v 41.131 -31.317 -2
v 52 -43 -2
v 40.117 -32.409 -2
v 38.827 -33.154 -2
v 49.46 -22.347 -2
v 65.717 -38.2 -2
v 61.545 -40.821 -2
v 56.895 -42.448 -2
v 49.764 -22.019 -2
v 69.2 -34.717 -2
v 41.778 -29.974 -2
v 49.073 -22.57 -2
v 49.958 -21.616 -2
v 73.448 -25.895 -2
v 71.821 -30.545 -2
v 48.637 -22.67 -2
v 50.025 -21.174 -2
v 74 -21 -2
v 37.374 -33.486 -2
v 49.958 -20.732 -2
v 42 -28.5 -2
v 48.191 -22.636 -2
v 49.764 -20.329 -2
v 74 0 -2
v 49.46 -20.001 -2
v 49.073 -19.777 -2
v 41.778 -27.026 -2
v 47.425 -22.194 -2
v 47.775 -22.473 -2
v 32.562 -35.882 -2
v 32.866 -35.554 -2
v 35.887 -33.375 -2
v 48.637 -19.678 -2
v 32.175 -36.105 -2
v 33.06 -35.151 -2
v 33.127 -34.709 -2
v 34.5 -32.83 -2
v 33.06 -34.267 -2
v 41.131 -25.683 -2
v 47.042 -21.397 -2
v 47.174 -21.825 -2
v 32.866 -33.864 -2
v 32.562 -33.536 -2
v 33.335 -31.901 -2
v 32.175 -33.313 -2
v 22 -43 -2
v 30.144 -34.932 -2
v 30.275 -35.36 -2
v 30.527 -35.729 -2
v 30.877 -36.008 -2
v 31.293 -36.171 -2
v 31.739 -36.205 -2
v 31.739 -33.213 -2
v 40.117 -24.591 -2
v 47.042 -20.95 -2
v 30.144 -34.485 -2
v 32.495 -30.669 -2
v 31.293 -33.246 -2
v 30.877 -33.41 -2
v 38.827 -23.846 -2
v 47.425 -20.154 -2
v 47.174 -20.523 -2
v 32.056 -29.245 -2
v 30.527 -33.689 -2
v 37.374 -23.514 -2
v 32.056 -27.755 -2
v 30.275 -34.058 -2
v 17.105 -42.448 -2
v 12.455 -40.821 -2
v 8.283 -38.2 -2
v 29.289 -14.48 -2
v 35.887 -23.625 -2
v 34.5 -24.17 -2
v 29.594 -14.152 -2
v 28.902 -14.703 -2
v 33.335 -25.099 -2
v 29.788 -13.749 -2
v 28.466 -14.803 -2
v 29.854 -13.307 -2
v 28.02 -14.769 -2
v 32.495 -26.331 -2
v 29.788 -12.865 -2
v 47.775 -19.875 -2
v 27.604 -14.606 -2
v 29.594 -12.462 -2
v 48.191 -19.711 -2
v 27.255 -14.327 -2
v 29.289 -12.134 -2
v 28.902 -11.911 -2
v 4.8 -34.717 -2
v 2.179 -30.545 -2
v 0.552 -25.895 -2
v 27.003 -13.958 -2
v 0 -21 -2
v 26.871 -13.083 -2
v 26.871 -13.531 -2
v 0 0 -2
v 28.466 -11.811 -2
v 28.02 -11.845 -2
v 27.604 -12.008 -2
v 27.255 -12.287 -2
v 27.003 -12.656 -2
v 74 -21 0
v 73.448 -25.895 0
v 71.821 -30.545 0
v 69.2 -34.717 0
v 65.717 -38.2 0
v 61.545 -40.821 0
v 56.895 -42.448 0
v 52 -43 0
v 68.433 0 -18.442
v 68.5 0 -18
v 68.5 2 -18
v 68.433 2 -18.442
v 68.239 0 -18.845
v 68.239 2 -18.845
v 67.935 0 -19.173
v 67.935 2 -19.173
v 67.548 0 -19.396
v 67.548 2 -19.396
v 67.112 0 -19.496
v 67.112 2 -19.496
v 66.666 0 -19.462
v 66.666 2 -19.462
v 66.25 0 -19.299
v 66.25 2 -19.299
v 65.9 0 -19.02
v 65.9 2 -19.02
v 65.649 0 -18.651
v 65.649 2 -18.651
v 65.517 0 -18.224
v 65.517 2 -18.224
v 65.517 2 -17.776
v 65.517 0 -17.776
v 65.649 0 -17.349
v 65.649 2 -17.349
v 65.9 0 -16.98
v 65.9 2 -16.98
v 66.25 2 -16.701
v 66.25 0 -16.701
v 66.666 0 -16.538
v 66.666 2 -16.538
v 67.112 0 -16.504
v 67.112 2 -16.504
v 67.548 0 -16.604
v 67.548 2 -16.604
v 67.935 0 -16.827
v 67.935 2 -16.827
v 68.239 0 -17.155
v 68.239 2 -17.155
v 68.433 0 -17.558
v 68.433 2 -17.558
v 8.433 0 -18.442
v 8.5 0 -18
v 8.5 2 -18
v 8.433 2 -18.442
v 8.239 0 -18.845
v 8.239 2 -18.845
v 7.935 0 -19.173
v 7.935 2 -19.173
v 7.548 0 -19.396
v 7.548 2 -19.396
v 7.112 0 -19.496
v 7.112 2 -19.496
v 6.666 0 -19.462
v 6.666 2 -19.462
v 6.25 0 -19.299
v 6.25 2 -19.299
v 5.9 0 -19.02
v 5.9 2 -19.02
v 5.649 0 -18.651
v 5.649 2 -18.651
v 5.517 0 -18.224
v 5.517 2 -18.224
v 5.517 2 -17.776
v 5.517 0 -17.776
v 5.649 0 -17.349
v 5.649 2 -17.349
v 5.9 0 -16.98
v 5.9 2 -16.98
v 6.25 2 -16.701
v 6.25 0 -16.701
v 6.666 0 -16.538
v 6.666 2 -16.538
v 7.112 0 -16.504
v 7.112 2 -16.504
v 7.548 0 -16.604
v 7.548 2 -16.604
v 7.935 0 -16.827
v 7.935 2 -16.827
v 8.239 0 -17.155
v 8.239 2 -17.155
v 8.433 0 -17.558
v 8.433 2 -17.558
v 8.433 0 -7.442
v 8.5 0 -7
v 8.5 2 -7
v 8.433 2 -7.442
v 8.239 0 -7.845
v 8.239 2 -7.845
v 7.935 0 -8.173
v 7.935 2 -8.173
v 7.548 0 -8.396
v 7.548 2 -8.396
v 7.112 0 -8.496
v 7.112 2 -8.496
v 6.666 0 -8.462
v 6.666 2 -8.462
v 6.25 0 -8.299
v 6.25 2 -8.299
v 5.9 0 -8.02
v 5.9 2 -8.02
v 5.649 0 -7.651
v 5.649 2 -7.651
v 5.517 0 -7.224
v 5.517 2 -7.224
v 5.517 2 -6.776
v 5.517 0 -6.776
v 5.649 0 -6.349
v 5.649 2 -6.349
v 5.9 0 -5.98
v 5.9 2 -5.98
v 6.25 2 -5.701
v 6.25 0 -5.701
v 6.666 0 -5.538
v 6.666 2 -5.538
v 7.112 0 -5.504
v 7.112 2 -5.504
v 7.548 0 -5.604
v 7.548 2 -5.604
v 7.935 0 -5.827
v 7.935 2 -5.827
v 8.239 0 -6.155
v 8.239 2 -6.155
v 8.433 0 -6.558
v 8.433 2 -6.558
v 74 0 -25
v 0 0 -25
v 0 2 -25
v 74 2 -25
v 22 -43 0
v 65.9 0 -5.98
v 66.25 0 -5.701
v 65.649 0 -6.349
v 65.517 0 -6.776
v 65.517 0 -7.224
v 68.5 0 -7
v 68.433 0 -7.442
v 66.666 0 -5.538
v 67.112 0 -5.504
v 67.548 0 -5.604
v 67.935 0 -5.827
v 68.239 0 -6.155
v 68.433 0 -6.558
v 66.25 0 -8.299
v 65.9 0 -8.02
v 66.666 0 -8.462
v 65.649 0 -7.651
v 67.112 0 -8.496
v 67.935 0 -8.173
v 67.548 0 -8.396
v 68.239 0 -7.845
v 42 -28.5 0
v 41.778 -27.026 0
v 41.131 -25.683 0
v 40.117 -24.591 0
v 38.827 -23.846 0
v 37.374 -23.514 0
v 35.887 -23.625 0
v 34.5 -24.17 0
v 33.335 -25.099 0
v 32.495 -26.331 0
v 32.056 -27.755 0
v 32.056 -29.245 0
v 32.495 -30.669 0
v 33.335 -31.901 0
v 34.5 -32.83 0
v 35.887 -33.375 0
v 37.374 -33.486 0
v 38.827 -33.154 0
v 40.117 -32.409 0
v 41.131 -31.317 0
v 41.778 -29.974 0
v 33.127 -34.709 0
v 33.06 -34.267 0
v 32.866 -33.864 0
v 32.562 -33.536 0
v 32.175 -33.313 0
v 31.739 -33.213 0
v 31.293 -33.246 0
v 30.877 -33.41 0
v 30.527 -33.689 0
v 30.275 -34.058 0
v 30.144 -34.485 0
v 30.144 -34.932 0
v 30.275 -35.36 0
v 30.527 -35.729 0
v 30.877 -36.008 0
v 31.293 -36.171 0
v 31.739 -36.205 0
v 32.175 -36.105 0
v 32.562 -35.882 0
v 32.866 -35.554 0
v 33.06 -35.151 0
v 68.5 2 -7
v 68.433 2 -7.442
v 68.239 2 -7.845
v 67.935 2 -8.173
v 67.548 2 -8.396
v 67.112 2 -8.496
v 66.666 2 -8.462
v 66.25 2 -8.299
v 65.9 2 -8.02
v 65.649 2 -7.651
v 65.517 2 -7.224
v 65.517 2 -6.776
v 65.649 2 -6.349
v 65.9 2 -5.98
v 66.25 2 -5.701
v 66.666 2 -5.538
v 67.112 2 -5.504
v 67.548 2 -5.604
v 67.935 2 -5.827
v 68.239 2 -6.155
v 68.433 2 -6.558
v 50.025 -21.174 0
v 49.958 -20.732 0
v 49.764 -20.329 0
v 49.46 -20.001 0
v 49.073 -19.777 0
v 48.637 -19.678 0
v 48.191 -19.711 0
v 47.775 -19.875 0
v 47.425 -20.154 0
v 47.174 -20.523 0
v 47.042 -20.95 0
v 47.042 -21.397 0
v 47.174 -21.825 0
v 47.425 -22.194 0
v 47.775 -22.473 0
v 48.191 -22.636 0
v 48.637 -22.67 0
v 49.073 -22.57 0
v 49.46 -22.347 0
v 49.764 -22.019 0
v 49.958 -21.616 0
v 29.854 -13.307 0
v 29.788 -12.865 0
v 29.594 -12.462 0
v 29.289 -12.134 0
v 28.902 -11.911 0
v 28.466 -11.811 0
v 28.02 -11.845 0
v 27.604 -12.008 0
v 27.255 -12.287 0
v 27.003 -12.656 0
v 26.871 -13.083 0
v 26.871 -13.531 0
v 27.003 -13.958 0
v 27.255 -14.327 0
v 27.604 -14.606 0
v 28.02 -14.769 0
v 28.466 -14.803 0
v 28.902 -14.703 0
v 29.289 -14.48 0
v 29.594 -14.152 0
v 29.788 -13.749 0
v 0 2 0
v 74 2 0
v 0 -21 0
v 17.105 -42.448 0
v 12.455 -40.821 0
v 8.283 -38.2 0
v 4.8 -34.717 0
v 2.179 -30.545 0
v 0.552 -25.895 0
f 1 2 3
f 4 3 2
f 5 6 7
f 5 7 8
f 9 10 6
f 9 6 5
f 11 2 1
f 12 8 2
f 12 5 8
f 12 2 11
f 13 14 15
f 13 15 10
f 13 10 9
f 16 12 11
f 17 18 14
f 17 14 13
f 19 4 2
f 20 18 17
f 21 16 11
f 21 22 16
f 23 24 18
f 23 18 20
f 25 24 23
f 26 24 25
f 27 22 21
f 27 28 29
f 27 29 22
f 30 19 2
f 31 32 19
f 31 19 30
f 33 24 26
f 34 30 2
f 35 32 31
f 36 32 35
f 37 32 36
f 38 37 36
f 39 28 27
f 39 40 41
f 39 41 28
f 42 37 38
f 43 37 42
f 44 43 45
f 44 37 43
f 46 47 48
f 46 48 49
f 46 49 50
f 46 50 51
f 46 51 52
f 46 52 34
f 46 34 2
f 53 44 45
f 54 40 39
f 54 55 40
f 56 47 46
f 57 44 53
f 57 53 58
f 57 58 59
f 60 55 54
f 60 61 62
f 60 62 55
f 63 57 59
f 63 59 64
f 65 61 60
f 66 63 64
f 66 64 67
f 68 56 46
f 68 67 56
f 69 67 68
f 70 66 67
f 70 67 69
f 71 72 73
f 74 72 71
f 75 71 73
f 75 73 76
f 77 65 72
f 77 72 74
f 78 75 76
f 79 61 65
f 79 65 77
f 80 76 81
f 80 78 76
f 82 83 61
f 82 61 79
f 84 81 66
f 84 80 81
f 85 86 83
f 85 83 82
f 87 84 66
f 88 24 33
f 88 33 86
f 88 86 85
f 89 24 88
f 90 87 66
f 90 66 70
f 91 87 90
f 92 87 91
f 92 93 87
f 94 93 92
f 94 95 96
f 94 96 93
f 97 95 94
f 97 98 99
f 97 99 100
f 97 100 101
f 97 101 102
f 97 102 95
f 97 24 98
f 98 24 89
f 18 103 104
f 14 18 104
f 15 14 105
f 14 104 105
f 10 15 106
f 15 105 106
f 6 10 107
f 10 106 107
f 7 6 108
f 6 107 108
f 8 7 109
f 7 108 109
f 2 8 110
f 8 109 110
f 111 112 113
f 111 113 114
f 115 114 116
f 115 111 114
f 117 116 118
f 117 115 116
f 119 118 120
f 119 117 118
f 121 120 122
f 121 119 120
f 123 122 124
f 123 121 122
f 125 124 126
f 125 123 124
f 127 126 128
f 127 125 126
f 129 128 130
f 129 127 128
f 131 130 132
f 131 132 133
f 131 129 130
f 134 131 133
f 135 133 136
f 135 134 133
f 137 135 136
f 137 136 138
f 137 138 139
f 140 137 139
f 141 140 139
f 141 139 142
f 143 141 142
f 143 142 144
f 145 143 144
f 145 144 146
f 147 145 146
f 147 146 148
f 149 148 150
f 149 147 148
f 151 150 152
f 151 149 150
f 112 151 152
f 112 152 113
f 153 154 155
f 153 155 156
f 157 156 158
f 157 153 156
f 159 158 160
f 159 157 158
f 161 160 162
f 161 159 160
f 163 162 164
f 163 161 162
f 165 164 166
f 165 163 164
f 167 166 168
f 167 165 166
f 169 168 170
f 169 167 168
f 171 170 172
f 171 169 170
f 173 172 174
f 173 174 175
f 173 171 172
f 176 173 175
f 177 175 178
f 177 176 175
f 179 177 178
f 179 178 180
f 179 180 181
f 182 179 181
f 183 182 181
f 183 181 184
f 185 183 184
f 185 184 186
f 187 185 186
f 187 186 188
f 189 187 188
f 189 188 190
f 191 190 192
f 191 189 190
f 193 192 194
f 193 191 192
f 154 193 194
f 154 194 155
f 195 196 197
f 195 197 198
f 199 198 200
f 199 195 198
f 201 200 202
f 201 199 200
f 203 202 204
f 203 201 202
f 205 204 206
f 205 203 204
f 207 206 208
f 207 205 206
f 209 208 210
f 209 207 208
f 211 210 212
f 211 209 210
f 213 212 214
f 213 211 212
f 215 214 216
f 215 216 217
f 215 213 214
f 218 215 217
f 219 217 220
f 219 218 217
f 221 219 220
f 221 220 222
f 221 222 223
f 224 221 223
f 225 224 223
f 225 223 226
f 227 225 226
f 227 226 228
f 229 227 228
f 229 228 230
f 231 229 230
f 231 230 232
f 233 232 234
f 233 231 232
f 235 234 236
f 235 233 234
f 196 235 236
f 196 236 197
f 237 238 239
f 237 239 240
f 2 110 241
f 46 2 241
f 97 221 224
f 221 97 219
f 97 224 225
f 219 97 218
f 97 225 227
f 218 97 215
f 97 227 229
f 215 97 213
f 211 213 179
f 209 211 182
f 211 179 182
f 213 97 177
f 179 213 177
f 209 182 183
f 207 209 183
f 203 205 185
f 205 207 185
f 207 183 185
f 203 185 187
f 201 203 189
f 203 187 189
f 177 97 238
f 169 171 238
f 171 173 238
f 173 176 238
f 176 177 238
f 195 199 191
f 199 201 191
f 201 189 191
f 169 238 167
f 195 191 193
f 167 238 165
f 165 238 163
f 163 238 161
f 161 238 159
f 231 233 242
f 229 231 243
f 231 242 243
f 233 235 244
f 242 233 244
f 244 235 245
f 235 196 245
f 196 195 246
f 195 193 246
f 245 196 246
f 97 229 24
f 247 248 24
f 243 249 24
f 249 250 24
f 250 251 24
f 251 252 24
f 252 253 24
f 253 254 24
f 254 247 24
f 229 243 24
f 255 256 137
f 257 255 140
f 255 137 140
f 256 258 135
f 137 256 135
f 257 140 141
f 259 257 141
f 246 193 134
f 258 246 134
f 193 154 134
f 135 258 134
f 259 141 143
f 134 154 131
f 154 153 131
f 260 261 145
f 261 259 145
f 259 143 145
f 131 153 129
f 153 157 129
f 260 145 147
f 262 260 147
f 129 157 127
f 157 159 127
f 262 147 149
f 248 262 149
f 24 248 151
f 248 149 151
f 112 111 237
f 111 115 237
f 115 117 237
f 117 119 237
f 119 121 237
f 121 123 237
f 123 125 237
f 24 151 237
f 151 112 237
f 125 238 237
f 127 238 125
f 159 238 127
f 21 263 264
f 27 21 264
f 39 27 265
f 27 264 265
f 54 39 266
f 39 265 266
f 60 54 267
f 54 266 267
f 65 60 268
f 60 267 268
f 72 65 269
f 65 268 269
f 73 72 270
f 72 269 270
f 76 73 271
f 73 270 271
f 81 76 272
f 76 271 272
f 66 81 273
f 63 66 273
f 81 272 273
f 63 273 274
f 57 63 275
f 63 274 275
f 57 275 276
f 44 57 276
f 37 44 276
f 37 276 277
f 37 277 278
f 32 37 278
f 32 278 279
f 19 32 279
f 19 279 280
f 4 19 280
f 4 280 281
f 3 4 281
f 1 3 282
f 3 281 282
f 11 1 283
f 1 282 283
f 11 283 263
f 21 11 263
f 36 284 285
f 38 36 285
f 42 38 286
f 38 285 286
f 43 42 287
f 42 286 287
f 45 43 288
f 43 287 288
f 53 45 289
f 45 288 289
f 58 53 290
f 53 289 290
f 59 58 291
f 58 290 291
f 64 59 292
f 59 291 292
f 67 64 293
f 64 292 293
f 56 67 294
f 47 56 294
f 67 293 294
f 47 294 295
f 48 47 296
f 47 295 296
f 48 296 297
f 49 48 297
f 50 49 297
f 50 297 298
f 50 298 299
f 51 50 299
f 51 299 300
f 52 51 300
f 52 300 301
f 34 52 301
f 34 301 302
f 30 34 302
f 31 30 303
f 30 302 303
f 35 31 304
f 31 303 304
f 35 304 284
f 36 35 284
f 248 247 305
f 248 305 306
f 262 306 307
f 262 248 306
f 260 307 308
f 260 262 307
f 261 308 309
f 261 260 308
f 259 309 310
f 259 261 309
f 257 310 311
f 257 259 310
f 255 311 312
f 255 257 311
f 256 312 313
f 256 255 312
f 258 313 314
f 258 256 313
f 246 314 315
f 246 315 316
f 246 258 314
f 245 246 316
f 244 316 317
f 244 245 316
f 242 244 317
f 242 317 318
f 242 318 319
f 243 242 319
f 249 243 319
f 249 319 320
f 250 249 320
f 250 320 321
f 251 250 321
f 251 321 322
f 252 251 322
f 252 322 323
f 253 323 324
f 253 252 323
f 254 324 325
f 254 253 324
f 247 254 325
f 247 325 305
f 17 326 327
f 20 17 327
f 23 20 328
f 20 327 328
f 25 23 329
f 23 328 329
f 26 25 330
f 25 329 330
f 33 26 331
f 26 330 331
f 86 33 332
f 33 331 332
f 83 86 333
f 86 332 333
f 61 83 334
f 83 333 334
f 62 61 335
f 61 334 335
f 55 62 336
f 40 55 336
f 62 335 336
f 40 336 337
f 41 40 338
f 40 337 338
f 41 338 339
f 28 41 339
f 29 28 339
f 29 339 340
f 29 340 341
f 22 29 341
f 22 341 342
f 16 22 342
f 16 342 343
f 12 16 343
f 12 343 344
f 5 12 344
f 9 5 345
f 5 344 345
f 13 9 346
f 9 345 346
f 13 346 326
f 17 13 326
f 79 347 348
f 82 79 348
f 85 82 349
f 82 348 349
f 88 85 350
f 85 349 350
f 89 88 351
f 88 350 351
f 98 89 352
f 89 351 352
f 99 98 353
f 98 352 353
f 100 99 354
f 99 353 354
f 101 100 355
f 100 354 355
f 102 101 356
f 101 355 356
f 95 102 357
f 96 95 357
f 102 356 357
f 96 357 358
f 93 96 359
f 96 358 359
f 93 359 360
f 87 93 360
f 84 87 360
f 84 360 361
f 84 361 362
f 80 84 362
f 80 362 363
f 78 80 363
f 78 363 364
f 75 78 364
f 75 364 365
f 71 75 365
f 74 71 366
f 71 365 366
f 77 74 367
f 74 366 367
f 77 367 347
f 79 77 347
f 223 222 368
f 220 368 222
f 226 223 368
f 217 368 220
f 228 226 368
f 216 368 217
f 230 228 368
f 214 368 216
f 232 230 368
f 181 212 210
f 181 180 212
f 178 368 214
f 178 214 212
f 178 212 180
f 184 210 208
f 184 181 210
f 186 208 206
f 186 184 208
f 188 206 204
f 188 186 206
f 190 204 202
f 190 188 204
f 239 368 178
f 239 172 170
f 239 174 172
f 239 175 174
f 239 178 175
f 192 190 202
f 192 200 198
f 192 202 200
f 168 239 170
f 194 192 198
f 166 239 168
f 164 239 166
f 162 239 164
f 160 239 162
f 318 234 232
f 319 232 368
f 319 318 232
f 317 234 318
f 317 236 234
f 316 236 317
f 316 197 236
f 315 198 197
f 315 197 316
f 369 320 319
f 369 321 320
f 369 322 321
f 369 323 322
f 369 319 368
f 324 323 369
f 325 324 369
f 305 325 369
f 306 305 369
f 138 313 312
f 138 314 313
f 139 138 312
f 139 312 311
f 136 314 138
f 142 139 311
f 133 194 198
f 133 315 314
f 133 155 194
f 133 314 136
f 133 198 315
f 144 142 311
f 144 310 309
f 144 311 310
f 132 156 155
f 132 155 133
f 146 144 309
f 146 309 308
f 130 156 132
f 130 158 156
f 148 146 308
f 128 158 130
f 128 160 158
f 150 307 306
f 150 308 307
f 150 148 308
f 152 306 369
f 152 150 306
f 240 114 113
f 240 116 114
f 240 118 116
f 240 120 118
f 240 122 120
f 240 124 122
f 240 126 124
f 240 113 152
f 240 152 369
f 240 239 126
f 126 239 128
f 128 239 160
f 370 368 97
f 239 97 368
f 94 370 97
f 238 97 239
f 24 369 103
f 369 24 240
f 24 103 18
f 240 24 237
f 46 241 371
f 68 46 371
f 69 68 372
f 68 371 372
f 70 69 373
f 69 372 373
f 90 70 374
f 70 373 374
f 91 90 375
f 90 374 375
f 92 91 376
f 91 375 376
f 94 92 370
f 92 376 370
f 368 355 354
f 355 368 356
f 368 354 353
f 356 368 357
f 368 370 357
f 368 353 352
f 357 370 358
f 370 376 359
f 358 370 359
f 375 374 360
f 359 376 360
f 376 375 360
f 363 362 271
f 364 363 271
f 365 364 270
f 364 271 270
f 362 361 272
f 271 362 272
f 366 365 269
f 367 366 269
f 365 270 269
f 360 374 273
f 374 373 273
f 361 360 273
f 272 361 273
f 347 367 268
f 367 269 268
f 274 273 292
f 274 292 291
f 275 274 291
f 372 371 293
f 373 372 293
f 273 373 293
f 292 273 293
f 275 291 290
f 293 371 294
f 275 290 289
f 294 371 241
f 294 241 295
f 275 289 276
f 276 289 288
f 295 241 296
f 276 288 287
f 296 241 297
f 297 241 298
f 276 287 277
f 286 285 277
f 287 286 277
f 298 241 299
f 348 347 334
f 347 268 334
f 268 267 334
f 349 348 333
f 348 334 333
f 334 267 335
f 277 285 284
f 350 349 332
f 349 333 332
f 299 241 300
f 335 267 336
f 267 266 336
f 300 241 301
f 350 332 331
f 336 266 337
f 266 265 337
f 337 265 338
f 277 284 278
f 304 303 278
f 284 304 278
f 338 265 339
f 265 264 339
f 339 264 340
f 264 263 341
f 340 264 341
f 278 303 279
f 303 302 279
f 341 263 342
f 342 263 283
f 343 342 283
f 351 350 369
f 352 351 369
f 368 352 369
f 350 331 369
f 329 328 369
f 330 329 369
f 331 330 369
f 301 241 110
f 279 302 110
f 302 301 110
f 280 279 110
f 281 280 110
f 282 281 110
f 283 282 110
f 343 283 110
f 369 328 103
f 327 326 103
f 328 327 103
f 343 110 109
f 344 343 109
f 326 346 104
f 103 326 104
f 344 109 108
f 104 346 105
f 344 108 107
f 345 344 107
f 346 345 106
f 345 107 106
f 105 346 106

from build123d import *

# Parameters (mm, degrees)
SKETCH_1_W      = 74
SKETCH_1_H      = 25
SKETCH_1_R      = 1.5
EXTRUDE_1_DEPTH = 2
SKETCH_2_R      = 5
SKETCH_2_R_2    = 1.5
EXTRUDE_2_DEPTH = 2


with BuildPart() as part:
    # Эскиз1 → Бобышка-Вытянуть1 (new body)
    with BuildSketch(Plane(origin=(0, 0, 0), x_dir=(1, 0, 0), z_dir=(0, 1, 0))):
        with Locations((37, 12.5)):
            Rectangle(SKETCH_1_W, SKETCH_1_H)
        with Locations((7, 18)):
            Circle(SKETCH_1_R, mode=Mode.SUBTRACT)
        with Locations((67, 18)):
            Circle(SKETCH_1_R, mode=Mode.SUBTRACT)
        with Locations((7, 7)):
            Circle(SKETCH_1_R, mode=Mode.SUBTRACT)
        with Locations((67, 7)):
            Circle(SKETCH_1_R, mode=Mode.SUBTRACT)
    extrude(amount=EXTRUDE_1_DEPTH)

    # Эскиз2 → Бобышка-Вытянуть2 (add)
    with BuildSketch(Plane.XY):
        with BuildLine():
            Line((0, 2), (74, 2))
            Line((74, 2), (74, -21))
            ThreePointArc((74, -21), (67.556349186, -36.556349186), (52, -43))
            Line((52, -43), (22, -43))
            ThreePointArc((22, -43), (6.443650814, -36.556349186), (0, -21))
            Line((0, -21), (0, 2))
        make_face()
        with Locations((37, -28.5)):
            Circle(SKETCH_2_R, mode=Mode.SUBTRACT)
        with Locations((28.354168617, -13.306972233)):
            Circle(SKETCH_2_R_2, mode=Mode.SUBTRACT)
        with Locations((48.525028222, -21.173764644)):
            Circle(SKETCH_2_R_2, mode=Mode.SUBTRACT)
        with Locations((31.626756345, -34.708845272)):
            Circle(SKETCH_2_R_2, mode=Mode.SUBTRACT)
    extrude(amount=-EXTRUDE_2_DEPTH)


solid = part.part
